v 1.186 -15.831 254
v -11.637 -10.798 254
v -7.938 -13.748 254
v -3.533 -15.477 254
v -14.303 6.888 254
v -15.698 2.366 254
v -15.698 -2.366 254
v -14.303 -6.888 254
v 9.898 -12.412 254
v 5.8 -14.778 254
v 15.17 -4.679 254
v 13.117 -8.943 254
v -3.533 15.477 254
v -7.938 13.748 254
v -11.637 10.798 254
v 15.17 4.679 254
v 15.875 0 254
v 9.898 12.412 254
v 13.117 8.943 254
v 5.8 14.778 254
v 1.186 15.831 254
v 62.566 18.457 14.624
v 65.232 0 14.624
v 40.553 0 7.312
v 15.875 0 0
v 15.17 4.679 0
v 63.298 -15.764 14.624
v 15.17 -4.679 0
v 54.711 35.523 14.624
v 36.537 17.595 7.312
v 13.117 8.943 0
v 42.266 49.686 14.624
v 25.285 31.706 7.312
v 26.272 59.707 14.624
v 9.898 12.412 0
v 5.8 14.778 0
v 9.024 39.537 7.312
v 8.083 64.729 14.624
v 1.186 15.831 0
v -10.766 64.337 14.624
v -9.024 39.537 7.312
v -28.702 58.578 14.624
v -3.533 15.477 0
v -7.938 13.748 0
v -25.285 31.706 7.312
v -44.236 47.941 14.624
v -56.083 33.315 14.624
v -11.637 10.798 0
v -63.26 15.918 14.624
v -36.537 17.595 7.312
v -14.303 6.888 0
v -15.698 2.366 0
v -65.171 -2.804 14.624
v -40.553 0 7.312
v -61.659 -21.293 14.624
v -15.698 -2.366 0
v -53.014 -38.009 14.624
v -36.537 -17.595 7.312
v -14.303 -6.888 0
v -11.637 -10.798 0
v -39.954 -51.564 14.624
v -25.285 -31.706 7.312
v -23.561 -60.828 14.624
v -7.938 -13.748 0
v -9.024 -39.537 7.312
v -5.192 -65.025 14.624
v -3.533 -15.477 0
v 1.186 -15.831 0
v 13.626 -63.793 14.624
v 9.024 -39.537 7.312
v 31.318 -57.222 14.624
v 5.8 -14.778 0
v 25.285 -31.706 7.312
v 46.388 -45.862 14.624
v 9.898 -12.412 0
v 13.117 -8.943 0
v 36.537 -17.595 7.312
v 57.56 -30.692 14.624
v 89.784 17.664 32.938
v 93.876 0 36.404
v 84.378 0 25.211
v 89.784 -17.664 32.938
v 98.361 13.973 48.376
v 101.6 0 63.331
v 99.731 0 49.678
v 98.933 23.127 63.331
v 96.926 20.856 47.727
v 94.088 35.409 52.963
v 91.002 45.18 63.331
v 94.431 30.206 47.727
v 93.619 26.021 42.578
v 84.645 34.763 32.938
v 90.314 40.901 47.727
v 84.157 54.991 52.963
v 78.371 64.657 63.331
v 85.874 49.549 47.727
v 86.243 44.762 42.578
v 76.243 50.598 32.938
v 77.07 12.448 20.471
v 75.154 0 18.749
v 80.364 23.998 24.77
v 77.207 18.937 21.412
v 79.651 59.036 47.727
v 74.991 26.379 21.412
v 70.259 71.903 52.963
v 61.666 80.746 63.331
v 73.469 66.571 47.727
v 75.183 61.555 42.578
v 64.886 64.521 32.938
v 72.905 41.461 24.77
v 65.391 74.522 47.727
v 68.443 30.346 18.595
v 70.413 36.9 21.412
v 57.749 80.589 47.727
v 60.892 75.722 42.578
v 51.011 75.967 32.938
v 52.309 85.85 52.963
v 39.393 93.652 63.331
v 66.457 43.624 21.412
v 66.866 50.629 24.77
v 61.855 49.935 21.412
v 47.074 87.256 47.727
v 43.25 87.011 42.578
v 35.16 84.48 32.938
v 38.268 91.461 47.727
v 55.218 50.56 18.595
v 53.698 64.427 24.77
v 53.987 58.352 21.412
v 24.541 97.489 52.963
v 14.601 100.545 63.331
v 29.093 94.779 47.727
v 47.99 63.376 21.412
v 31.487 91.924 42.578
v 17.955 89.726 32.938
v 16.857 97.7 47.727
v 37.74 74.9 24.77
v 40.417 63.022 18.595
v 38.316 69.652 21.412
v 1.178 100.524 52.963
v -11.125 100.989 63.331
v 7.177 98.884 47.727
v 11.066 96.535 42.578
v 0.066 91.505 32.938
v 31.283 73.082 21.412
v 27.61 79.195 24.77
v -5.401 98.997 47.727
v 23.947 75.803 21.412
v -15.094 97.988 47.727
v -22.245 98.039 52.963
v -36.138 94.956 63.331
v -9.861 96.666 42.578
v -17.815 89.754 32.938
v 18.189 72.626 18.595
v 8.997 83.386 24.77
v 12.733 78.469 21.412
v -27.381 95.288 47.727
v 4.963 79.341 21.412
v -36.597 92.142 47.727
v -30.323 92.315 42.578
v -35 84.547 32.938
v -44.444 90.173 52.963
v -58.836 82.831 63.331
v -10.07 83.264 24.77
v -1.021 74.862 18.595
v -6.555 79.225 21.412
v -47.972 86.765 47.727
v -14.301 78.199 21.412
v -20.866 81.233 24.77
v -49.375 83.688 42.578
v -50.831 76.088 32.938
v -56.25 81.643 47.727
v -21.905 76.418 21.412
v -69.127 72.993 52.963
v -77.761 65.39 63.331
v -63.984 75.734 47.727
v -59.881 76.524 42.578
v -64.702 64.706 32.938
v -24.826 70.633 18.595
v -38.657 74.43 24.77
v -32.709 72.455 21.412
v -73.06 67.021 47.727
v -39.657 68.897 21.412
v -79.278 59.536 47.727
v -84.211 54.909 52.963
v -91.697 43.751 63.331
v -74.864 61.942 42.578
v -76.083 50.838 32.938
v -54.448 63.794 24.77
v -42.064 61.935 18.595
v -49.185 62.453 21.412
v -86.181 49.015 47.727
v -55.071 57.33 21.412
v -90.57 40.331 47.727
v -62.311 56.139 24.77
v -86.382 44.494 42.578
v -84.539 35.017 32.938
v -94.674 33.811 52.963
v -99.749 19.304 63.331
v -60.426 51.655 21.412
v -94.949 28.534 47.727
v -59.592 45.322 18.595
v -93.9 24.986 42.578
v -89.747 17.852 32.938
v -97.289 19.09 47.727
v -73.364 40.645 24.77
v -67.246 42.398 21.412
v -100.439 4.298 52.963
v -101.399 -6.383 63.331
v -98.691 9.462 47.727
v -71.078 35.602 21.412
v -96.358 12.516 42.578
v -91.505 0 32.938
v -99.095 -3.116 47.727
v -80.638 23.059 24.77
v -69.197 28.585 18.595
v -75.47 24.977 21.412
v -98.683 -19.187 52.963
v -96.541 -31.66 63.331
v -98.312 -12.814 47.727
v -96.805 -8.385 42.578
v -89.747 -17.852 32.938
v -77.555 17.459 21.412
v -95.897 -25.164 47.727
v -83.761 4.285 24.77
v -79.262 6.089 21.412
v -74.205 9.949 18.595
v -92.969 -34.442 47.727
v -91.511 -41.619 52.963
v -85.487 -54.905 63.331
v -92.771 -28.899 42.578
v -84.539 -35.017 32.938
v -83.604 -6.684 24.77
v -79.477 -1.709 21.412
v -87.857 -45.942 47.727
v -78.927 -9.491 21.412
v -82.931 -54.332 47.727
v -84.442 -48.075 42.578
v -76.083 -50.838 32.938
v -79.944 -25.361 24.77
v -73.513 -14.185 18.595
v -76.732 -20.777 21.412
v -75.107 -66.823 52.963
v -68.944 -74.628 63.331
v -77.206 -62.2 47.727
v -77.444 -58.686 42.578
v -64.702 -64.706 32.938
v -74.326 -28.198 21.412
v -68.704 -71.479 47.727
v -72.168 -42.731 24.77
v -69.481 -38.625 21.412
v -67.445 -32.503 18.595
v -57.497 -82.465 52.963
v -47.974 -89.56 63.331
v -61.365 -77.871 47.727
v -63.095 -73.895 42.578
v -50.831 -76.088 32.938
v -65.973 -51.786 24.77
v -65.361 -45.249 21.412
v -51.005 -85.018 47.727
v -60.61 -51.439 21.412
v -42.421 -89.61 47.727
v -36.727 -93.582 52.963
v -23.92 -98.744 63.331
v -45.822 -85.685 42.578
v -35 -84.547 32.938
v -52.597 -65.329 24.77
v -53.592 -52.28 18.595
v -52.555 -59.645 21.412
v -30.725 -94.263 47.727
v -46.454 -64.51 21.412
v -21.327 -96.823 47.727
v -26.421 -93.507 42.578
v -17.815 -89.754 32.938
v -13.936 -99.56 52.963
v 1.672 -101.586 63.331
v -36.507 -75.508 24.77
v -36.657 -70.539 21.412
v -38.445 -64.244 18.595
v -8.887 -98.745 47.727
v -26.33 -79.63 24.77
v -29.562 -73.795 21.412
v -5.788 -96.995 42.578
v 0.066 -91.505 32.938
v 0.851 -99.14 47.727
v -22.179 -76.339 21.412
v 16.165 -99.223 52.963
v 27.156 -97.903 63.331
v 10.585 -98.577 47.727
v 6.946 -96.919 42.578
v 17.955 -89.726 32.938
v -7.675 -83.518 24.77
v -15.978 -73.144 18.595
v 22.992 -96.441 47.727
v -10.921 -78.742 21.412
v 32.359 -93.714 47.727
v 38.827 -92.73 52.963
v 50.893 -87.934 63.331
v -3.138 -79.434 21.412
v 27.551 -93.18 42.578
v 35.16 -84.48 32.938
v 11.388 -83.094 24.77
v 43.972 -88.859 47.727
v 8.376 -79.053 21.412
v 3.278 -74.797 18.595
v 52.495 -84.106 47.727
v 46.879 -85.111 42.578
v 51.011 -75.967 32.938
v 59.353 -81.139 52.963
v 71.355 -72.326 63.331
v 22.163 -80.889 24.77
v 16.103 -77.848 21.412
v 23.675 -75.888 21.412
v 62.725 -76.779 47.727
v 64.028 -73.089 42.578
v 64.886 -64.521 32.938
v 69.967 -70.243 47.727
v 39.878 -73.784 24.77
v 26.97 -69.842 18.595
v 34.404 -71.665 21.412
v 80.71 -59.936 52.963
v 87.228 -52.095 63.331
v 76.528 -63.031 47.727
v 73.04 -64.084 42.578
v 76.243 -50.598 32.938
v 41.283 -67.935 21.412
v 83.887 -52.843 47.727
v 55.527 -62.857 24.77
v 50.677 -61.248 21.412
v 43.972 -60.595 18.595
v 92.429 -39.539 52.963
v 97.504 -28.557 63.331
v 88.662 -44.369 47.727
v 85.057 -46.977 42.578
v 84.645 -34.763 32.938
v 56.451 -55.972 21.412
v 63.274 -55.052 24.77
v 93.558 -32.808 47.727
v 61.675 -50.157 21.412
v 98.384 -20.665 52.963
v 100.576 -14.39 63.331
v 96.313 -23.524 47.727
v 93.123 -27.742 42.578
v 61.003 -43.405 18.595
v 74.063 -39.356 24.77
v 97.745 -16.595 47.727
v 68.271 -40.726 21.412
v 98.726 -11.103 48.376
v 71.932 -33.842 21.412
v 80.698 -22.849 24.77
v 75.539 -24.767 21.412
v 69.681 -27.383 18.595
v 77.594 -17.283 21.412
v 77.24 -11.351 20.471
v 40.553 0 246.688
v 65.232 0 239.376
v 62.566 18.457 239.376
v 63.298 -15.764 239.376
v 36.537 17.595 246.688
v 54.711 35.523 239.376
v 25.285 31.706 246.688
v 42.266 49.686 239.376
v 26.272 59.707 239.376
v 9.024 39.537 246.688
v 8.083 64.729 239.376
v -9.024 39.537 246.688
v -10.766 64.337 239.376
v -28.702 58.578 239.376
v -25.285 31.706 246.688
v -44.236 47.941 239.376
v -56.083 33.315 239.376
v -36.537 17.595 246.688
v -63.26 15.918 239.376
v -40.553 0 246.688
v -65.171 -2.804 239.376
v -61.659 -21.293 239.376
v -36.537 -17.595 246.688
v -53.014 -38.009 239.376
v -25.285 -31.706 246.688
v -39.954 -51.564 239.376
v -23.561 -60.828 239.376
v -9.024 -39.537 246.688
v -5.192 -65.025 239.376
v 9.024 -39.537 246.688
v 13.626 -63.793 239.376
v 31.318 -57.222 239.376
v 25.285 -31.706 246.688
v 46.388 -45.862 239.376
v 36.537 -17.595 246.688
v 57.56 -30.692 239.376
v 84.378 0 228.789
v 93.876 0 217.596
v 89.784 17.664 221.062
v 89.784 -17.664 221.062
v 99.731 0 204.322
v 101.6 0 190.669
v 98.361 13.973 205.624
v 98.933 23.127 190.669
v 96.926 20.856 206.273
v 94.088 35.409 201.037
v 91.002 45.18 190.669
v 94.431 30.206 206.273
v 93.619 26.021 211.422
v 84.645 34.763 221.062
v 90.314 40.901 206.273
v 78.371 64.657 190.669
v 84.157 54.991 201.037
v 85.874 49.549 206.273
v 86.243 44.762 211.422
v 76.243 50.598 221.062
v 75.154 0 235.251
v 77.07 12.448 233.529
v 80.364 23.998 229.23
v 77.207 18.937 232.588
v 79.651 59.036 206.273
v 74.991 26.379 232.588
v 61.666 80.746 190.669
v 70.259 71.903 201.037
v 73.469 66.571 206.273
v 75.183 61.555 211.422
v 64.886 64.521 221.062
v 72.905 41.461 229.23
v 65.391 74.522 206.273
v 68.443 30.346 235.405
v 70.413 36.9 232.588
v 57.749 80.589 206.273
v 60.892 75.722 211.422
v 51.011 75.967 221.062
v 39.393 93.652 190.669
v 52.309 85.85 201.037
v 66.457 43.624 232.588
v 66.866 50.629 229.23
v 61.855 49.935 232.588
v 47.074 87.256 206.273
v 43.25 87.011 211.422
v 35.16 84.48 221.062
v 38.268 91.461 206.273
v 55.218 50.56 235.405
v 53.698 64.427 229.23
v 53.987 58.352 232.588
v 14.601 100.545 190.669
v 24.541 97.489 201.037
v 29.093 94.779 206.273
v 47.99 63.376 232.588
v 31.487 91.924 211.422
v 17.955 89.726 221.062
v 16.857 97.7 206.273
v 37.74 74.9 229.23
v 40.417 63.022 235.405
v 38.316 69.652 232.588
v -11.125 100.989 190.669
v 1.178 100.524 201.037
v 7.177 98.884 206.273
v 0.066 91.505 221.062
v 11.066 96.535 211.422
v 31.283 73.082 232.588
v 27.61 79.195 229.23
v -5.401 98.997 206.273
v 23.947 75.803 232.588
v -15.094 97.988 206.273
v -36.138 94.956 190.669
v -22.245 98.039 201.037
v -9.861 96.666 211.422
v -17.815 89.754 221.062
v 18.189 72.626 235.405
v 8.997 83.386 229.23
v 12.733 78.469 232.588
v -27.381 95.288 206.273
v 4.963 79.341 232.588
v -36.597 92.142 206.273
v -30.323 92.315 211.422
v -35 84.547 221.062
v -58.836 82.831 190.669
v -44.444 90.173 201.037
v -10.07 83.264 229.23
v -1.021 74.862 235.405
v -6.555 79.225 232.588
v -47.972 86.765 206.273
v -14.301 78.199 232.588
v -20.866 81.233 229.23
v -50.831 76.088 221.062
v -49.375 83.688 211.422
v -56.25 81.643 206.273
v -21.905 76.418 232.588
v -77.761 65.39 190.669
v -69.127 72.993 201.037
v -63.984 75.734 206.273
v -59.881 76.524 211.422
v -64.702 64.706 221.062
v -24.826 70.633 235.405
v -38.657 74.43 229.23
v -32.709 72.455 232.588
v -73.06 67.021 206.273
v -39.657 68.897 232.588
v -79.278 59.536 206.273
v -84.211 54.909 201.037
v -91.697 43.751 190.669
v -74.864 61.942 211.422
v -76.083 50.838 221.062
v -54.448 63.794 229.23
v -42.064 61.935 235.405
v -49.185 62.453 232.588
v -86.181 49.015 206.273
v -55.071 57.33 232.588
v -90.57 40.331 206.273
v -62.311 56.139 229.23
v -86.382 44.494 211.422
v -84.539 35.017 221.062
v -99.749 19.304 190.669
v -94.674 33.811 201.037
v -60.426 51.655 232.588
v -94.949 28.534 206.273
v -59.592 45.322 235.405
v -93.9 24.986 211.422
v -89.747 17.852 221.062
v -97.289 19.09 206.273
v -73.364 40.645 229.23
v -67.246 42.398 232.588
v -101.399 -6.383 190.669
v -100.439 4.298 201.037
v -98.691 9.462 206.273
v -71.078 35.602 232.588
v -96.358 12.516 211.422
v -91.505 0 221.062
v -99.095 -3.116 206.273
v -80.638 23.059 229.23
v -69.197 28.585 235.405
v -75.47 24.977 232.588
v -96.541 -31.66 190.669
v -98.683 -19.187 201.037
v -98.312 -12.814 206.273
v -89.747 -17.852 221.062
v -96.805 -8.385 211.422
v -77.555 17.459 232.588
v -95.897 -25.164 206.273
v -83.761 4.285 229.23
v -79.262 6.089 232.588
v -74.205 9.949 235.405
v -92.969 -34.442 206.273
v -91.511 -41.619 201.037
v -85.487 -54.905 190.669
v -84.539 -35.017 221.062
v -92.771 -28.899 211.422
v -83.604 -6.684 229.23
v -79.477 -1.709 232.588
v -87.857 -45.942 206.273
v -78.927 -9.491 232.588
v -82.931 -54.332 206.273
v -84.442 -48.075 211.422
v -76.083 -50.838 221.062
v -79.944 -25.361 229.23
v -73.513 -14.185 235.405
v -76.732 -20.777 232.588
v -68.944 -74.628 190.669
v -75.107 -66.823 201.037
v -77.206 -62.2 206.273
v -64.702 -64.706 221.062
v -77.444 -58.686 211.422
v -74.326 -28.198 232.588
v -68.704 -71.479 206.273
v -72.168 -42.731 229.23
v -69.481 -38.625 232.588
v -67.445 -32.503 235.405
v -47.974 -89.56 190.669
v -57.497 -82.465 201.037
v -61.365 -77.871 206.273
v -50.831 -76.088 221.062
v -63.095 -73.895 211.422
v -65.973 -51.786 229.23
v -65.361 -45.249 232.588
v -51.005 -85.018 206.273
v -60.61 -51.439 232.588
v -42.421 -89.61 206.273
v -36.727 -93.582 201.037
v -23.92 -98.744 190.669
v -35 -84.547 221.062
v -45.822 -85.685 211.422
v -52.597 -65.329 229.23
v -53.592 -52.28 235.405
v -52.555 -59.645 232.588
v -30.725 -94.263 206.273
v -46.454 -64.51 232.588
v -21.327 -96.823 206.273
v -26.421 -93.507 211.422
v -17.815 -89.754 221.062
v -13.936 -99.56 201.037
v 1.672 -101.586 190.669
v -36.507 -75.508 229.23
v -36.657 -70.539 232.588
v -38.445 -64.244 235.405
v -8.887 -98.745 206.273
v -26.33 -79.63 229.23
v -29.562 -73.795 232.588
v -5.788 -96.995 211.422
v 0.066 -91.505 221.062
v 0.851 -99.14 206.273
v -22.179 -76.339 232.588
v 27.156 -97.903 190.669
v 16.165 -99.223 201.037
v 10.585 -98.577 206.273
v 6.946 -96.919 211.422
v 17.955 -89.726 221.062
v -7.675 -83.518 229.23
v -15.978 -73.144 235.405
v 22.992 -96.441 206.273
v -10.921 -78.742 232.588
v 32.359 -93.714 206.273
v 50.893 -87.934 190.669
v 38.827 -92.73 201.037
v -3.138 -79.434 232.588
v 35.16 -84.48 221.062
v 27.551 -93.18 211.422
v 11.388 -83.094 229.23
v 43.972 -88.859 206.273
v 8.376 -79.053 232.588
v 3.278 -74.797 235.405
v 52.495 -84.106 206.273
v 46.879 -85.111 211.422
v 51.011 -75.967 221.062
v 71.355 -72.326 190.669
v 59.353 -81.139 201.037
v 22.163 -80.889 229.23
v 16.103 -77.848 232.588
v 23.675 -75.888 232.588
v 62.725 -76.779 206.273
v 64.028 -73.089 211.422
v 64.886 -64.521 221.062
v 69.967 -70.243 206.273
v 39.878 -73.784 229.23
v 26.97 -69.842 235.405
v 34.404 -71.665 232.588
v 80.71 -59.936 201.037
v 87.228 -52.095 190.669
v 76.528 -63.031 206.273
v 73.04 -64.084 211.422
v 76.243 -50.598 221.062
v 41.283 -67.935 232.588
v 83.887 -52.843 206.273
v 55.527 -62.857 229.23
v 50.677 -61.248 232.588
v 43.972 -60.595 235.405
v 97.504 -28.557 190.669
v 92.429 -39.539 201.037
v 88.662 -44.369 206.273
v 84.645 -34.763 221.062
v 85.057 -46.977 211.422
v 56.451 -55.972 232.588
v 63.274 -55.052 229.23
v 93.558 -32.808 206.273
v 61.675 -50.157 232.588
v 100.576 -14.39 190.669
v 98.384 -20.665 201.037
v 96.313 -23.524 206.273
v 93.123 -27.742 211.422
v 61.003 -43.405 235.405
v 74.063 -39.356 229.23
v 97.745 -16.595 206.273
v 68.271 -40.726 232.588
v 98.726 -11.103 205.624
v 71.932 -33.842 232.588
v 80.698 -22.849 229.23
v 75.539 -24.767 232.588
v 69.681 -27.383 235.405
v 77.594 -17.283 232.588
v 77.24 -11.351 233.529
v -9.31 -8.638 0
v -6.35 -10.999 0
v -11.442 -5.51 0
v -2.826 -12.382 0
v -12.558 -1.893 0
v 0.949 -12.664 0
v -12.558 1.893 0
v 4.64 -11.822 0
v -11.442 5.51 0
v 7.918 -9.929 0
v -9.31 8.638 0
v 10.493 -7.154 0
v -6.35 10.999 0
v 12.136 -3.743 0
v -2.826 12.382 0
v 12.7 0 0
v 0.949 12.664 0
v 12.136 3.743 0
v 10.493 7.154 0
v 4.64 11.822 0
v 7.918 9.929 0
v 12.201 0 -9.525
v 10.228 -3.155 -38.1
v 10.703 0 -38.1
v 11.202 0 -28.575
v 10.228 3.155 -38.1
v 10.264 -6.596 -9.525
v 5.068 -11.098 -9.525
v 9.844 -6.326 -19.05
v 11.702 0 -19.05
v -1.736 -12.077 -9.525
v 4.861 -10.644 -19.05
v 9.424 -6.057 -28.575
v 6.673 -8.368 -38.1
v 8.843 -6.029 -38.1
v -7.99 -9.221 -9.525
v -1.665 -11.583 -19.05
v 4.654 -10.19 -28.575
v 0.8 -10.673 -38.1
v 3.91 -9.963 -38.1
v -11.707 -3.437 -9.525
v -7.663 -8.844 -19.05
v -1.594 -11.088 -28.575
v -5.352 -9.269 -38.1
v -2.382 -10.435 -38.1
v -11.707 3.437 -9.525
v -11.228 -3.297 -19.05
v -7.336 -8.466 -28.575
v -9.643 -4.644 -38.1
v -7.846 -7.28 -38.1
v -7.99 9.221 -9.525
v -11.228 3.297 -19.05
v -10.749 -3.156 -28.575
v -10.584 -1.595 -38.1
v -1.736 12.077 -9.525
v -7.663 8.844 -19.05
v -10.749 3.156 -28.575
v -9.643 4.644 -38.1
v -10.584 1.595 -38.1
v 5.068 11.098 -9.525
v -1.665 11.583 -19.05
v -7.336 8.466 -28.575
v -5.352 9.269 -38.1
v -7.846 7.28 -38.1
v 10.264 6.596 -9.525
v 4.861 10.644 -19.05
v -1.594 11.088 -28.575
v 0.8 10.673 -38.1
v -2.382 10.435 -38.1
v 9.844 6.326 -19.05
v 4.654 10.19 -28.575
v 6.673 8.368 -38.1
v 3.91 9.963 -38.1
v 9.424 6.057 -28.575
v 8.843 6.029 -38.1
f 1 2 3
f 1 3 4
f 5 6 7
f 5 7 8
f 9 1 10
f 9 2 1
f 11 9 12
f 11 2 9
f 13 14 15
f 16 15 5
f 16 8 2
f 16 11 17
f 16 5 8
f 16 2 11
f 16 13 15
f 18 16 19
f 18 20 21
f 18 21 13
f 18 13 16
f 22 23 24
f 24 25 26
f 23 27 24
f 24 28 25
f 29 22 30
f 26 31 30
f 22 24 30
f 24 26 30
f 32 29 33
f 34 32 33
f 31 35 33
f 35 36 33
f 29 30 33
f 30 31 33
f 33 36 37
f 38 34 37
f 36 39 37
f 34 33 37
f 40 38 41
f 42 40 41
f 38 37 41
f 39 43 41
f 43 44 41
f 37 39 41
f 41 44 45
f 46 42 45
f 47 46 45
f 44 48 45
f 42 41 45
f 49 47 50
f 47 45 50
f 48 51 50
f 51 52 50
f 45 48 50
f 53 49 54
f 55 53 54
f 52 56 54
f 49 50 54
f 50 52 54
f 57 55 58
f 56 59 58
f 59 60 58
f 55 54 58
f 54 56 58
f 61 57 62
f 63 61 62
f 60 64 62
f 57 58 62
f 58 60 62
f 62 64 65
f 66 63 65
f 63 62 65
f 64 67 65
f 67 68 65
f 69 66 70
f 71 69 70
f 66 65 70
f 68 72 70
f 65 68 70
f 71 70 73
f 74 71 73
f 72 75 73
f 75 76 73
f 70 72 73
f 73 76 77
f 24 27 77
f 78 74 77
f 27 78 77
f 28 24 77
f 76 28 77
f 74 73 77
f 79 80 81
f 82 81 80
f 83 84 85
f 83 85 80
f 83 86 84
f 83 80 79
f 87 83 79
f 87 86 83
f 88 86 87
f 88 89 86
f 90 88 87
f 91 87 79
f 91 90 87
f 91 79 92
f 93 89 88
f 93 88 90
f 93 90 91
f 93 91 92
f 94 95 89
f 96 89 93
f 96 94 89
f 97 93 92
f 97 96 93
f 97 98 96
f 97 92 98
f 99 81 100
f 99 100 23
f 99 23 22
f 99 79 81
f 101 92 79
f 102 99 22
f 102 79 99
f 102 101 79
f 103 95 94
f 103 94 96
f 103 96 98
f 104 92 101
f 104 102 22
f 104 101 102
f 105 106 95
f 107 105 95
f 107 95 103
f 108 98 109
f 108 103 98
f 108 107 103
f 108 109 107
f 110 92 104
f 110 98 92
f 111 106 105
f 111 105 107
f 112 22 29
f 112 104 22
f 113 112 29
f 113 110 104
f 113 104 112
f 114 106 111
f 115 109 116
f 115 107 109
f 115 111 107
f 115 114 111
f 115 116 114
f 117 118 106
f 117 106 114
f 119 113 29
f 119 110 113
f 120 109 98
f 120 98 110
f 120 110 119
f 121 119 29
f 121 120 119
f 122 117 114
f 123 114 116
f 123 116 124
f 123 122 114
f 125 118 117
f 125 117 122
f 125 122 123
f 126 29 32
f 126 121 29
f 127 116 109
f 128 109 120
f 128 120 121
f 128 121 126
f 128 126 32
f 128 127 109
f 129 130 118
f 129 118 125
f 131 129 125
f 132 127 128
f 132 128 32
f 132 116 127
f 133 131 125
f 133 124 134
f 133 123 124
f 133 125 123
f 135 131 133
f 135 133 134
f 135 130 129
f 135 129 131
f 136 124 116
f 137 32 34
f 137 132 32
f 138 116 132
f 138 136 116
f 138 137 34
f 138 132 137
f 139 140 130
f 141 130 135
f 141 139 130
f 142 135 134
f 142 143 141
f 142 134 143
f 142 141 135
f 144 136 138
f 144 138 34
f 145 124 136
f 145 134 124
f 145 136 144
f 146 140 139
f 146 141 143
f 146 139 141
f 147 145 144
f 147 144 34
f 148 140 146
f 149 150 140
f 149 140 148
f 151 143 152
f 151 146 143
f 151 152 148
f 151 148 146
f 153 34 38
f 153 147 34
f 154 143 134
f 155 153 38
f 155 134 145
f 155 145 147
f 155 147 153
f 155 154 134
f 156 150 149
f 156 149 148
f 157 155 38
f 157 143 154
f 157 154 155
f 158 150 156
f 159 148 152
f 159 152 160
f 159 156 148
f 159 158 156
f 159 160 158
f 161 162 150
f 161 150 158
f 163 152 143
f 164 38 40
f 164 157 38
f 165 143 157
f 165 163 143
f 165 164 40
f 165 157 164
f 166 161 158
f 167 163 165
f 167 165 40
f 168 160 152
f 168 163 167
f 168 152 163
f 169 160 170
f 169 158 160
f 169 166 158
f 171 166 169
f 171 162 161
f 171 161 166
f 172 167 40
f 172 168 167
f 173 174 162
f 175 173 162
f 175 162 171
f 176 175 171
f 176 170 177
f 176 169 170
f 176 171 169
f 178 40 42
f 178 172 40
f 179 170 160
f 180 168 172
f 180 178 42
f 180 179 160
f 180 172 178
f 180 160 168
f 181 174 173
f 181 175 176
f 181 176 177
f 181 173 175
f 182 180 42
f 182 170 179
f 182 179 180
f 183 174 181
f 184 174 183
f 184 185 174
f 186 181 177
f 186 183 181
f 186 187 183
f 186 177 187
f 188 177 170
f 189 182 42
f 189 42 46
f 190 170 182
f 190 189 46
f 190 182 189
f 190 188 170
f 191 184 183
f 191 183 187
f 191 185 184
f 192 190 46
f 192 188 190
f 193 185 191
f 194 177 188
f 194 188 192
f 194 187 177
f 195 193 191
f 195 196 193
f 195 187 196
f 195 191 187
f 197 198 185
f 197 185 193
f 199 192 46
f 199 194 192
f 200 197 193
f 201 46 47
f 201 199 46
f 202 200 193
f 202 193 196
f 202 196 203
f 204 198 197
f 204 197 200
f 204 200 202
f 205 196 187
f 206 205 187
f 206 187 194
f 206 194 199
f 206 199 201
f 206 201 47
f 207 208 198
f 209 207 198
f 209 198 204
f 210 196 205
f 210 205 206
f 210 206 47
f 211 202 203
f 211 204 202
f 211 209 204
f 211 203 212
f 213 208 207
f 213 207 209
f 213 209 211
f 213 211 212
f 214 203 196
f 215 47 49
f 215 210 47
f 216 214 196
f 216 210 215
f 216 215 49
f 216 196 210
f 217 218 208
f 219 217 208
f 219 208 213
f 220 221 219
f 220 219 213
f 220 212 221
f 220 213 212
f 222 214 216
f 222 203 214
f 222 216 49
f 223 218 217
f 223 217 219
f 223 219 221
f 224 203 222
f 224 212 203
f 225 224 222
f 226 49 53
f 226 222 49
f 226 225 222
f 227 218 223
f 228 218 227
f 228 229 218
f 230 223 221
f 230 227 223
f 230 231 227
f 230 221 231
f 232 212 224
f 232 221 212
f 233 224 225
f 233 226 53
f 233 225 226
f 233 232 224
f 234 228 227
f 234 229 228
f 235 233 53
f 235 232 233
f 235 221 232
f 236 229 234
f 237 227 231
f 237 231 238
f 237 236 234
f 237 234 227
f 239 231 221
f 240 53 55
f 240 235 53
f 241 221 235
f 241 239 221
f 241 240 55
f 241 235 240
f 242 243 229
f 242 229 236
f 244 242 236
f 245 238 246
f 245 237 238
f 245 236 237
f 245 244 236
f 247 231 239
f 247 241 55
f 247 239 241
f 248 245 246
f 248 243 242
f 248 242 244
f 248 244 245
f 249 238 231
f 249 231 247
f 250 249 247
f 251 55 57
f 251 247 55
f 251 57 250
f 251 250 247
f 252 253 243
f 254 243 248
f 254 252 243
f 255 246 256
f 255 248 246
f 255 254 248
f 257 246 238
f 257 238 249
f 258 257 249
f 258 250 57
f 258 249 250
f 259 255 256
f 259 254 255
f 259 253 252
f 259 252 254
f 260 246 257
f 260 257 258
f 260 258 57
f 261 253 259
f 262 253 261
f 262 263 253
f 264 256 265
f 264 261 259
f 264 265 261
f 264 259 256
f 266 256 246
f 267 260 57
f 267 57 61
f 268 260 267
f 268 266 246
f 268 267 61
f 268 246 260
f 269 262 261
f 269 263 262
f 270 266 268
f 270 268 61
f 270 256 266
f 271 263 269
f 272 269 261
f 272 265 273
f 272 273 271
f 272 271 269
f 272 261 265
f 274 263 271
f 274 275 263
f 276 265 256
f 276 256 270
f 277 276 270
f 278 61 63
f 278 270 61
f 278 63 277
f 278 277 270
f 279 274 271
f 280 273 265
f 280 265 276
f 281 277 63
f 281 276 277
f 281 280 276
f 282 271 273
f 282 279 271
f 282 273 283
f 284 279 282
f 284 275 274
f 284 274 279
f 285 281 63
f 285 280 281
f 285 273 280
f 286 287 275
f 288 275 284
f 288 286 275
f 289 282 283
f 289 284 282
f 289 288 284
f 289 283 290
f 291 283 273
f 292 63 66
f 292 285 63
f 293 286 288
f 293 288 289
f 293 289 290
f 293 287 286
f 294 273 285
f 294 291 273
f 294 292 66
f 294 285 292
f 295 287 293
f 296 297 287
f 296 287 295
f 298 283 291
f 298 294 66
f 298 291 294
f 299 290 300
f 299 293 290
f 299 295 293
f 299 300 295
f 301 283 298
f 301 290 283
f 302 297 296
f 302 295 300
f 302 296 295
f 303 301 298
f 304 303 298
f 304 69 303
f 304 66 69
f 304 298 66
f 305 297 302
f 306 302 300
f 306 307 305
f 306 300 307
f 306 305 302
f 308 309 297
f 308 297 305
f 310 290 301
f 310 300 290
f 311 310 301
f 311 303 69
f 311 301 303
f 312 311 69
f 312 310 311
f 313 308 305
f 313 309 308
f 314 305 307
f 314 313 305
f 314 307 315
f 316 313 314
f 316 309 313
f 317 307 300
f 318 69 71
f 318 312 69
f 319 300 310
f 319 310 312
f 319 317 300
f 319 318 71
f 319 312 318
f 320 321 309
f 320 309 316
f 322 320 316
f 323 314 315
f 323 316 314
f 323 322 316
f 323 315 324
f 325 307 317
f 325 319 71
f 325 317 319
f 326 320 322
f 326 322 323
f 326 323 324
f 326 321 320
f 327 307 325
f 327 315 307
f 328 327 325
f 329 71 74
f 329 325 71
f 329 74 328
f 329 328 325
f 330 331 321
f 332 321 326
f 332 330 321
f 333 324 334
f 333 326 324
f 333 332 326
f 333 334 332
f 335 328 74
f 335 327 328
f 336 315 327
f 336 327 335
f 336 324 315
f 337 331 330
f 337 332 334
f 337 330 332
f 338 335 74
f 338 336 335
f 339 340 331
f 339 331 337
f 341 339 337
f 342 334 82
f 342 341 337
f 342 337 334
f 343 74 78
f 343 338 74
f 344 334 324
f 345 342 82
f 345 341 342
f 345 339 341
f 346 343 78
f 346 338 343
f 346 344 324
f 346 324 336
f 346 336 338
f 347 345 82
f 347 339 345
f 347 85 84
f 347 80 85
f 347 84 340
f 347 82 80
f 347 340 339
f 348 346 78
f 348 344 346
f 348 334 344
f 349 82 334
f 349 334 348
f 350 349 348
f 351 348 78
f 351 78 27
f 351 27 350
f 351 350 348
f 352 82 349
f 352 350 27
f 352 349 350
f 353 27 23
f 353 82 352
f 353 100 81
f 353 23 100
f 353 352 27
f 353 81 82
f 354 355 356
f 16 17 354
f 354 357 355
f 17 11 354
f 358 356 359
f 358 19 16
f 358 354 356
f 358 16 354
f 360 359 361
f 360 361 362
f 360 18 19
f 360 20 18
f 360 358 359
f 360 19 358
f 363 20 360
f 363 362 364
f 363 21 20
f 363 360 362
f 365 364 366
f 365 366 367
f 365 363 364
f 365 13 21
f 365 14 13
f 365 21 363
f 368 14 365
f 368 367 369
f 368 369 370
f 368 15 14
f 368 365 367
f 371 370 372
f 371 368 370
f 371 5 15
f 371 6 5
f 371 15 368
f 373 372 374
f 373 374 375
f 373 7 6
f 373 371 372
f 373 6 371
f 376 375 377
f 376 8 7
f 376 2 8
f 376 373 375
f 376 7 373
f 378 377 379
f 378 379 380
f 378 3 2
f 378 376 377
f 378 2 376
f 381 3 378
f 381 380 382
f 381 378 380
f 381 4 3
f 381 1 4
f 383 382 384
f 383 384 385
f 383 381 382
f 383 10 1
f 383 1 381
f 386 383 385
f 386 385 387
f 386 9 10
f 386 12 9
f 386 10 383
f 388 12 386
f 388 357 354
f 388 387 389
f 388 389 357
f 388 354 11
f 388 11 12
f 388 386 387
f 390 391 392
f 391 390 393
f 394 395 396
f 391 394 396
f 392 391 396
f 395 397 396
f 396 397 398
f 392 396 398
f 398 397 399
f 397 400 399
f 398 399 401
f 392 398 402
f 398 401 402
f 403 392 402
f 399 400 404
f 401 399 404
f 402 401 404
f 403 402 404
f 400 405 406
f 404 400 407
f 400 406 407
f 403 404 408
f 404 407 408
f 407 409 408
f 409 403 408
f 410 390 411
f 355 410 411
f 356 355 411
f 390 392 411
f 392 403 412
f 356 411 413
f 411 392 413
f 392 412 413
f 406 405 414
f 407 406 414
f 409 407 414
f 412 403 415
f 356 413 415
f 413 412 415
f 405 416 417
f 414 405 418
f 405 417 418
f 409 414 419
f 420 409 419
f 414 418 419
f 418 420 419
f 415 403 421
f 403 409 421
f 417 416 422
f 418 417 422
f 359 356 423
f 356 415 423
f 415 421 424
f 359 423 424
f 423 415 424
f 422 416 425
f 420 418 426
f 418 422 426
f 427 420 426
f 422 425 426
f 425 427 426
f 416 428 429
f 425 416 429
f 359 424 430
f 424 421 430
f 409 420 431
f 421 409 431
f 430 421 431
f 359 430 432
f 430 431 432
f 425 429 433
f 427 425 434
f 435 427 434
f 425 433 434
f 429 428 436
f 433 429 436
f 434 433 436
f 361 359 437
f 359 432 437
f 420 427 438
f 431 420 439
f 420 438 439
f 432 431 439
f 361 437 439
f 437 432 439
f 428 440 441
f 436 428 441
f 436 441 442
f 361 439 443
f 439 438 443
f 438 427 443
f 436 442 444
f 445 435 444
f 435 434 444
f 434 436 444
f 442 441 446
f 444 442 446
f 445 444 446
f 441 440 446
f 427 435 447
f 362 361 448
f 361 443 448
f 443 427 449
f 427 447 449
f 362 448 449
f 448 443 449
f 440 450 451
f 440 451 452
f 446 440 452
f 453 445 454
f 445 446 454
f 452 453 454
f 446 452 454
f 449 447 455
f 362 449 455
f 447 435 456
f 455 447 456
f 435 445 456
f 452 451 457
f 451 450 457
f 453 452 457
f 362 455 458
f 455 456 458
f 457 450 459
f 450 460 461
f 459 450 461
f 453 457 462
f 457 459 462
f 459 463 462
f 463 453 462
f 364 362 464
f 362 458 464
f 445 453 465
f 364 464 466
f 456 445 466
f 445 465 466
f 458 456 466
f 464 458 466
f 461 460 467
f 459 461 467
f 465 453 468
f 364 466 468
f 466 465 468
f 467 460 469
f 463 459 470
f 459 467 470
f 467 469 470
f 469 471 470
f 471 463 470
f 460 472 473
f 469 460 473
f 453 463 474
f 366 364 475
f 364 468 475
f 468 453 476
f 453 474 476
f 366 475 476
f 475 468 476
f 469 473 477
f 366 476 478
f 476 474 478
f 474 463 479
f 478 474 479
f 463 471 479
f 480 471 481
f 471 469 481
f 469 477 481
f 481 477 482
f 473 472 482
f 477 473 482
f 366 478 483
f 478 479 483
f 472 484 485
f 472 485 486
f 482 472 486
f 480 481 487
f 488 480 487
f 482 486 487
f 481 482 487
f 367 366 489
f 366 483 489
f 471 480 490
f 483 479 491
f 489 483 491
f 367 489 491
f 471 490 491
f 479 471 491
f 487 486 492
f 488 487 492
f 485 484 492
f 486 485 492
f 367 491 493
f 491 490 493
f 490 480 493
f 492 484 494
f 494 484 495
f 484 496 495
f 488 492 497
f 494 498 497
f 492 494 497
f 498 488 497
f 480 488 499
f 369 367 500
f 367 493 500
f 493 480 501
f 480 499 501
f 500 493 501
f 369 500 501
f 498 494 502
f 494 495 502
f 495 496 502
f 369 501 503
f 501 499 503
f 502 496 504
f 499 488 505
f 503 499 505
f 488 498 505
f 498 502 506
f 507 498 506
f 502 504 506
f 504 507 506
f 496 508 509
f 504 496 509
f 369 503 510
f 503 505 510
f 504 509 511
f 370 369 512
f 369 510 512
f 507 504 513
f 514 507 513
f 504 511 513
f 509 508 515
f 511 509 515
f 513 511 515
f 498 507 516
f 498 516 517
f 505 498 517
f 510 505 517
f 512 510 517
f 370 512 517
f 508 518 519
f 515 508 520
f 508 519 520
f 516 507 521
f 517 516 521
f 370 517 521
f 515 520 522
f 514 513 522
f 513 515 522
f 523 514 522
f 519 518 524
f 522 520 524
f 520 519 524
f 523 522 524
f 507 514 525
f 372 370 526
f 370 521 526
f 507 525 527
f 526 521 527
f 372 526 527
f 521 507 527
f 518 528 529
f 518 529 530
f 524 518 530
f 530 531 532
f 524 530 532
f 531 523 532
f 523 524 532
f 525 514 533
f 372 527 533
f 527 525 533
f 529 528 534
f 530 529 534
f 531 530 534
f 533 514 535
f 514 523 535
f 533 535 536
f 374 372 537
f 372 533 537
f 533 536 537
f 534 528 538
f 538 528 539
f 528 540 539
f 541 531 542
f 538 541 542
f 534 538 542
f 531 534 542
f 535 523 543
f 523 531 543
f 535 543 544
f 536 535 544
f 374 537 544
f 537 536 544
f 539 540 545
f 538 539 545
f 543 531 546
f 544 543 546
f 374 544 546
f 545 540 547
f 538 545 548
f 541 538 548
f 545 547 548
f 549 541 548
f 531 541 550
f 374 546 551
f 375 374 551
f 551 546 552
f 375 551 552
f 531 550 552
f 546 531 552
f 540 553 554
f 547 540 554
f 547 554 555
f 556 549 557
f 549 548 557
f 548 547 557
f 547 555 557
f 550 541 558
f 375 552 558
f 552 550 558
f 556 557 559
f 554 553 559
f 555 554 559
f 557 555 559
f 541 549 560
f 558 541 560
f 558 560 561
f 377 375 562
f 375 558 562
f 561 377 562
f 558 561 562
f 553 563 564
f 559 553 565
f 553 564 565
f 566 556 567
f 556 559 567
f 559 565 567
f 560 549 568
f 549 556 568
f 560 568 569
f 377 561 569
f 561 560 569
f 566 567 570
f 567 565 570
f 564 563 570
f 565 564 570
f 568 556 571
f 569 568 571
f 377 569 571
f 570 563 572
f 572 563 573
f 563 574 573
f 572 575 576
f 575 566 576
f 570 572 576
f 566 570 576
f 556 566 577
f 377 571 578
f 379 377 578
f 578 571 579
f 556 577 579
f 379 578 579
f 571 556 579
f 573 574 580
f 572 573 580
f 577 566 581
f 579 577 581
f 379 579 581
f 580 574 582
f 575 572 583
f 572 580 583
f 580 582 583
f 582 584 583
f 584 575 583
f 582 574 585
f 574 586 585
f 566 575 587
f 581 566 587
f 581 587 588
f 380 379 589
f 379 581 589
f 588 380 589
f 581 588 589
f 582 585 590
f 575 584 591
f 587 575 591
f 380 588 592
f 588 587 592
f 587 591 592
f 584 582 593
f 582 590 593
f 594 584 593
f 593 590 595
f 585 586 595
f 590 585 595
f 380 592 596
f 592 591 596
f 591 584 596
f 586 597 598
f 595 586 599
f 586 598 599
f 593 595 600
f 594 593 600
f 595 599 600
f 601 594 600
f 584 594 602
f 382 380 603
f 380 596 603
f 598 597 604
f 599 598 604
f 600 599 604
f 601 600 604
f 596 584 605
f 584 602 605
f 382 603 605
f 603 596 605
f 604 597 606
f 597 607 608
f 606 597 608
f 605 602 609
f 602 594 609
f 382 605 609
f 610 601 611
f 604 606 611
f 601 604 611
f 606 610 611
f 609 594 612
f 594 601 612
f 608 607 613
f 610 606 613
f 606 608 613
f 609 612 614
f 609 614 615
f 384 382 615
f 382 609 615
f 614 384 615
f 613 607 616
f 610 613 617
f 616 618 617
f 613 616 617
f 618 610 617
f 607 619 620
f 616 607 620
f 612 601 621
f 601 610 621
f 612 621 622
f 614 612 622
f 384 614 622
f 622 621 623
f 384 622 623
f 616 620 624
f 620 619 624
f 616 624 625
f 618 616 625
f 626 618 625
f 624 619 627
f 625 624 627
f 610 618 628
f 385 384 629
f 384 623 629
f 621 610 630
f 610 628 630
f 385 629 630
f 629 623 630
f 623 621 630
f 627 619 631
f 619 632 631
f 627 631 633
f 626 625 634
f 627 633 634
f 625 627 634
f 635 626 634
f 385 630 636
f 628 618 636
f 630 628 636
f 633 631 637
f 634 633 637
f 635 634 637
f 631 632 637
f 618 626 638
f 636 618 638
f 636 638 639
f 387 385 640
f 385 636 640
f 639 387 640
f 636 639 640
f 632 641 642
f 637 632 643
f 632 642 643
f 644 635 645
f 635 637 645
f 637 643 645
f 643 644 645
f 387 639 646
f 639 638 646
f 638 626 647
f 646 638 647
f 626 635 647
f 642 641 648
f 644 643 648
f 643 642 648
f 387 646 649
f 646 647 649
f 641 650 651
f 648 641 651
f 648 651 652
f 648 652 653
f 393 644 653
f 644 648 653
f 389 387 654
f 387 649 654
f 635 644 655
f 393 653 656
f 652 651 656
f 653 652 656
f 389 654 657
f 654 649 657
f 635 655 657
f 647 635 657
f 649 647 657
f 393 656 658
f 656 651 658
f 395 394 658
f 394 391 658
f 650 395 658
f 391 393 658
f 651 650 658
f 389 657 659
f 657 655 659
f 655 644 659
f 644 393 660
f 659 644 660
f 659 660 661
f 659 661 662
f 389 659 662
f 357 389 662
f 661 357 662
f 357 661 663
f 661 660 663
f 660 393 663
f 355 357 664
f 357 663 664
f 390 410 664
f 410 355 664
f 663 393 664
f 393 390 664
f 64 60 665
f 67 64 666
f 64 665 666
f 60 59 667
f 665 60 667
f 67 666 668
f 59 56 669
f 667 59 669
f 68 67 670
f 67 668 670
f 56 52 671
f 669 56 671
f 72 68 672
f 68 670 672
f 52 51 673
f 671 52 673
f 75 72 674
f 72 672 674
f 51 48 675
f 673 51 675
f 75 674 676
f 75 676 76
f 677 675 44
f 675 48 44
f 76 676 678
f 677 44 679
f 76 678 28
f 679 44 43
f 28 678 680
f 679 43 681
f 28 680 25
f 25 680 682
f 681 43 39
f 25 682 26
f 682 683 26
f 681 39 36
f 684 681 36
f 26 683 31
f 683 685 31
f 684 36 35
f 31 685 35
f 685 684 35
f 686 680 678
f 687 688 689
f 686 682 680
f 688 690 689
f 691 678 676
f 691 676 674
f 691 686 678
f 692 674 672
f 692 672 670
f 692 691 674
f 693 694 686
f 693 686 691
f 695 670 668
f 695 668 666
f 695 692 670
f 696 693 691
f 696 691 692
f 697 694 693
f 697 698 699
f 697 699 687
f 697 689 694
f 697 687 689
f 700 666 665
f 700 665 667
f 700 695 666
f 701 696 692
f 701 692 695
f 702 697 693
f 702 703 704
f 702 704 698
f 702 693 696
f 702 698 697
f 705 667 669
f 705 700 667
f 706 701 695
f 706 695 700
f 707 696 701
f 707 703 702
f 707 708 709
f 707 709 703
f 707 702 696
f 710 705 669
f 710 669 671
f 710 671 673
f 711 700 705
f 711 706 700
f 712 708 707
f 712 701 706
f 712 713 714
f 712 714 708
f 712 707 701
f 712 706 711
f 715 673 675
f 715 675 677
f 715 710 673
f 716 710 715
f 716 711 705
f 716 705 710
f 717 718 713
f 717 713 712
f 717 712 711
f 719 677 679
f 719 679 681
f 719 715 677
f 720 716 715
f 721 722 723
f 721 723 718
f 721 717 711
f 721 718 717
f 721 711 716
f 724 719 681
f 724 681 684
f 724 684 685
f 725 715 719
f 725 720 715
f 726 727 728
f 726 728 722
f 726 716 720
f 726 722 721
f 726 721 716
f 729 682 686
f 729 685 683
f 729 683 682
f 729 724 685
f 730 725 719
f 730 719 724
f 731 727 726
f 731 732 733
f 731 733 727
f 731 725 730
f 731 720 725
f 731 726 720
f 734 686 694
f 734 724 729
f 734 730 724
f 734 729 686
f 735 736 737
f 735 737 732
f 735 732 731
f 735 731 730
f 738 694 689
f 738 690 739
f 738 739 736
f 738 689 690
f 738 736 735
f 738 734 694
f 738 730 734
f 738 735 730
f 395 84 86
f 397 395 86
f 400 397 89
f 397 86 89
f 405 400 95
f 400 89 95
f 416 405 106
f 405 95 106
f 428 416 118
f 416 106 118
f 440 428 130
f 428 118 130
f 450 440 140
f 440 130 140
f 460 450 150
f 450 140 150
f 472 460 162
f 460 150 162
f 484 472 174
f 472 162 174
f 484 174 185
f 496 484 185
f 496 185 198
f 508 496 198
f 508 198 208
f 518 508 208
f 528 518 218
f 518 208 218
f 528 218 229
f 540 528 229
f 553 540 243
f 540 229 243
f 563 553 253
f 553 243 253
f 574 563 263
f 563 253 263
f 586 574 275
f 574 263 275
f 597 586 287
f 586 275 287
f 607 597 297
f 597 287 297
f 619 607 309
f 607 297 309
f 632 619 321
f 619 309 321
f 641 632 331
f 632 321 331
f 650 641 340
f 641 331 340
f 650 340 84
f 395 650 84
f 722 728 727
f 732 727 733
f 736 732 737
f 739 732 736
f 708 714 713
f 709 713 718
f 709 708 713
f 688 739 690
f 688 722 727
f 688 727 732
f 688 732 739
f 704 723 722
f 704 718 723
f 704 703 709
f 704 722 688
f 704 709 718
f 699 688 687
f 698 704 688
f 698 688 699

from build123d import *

# Parameters (mm, degrees)
F0_R     = 101.6
F1_DEPTH = 254
F2_R     = 12.7
F3_DEPTH = 38.1
F3_TAPER = 3
F4_SIZE2 = 85.725
F4_SIZE  = 25.4
F5_R     = 50.8


with BuildPart() as f1:
    # F0 (on Top) → F1 (new body)
    with BuildSketch(Plane.XY):
        Circle(F0_R)
    extrude(amount=F1_DEPTH)

    # F2 (on face) → F3 (join)
    with BuildSketch(Plane(origin=(0, 0, 0), x_dir=(1, 0, 0), z_dir=(0, 0, -1))):
        Circle(F2_R)
    extrude(amount=F3_DEPTH, taper=F3_TAPER)

    # F4
    f4_edges = [f1.edges().sort_by_distance(p)[0] for p in [
        (-101.6, 0, 254),
        (-101.6, 0, 0),
    ]]
    f4_side = f1.faces().sort_by_distance((-101.6, 0, 127))[0]
    chamfer(f4_edges, length=F4_SIZE, length2=F4_SIZE2, reference=f4_side)

    # F5
    f5_edges = [f1.edges().sort_by_distance(p)[0] for p in [
        (-101.6, 0, 25.4),
        (-101.6, 0, 228.6),
    ]]
    fillet(f5_edges, radius=F5_R)


solid = f1.part
